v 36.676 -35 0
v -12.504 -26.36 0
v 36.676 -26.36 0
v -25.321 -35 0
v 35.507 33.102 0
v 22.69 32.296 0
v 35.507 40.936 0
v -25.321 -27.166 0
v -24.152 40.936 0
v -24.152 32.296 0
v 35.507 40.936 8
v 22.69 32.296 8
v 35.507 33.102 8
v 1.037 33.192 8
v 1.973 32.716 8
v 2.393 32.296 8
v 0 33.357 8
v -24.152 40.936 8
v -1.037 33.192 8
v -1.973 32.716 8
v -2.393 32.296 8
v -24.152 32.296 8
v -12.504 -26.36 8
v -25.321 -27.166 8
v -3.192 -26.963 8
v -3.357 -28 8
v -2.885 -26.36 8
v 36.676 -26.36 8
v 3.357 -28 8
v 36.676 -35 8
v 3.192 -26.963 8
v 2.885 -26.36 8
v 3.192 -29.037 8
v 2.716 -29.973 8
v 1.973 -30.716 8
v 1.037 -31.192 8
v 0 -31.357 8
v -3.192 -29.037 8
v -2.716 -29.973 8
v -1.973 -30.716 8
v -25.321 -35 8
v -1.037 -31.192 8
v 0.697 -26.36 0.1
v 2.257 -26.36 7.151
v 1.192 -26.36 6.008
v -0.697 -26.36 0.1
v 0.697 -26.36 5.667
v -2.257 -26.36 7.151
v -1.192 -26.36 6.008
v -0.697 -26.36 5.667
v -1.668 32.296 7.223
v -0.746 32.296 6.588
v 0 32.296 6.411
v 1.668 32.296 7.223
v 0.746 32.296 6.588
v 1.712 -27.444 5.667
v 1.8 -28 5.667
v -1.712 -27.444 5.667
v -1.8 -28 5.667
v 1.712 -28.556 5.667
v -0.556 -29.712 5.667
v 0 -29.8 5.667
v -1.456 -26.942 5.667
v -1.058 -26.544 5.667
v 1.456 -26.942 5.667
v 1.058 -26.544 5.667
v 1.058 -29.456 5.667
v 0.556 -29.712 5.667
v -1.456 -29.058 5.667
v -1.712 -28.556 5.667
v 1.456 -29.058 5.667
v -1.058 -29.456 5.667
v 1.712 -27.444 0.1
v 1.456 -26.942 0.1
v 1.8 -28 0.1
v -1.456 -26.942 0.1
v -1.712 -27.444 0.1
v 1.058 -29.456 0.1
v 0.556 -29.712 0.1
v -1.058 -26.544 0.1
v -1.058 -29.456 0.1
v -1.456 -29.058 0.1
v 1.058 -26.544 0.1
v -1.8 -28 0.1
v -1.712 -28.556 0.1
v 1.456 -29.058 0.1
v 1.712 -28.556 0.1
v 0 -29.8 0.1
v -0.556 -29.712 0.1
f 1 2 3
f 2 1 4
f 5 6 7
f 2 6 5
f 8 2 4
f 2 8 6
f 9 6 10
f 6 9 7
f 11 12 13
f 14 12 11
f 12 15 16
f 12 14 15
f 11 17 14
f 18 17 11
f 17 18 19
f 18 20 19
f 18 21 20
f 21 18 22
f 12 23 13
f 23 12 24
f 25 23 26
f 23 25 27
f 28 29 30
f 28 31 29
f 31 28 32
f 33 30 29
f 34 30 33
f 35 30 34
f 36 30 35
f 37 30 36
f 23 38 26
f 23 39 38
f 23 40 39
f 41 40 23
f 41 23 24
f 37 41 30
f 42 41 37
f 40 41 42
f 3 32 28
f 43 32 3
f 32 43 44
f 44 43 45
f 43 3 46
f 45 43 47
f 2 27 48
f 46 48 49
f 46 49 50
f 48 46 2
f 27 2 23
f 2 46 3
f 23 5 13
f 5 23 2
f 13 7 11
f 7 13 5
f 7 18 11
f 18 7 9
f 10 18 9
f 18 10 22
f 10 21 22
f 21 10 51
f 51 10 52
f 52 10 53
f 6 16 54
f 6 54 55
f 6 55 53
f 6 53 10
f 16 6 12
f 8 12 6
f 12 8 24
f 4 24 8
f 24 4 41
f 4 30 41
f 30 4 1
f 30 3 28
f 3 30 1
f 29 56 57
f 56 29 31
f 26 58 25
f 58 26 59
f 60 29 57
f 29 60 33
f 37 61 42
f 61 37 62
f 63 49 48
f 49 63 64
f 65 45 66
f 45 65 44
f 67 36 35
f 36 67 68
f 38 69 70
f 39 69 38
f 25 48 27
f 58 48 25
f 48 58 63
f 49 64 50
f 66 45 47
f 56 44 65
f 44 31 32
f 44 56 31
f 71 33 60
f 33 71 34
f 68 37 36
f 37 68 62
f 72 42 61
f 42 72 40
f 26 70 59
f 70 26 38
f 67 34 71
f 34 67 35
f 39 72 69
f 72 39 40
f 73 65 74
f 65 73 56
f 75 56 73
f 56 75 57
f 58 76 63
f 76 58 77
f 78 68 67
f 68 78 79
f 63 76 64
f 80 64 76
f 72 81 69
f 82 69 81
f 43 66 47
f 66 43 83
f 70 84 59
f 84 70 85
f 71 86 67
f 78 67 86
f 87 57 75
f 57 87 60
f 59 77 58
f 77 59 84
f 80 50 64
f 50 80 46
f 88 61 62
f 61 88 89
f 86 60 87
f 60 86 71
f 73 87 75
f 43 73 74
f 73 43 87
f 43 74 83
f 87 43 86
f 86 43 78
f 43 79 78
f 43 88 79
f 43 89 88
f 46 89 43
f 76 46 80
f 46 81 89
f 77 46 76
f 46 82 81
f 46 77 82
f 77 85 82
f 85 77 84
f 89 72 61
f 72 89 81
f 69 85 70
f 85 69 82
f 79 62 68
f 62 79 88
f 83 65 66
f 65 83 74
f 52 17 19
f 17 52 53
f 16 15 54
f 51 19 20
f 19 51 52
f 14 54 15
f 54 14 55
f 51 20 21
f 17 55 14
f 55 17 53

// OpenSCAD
// Street Numbers for 3D printing
// Charles Tilford, 2019
// License: CC BY-NC-SA 4.0
//   https://creativecommons.org/licenses/by-nc-sa/4.0/

char="Z";     // The number/letter to print

// Units are in mm, except for height of letter

// How many inches high should letter be?
inchesHigh=3;
// How thick/deep should letter be (mm)?
depth=8;

// Character coordinates just center the letter
charX=-30;    // Character X coord
charY=-35;    // Character Y coord
topScrew=30;  // Top screw Y coord
botScrew=-28; // Bottom screw Y coord
height=8;     // Thickness of character
// Screw dimensions. Default presumes
// #6 sheet metal screw
screwWid=3.6; // Width of screw shaft
screwTop=6.78;// Width of screw head
screwCon=5.08;// Height of head 'cone'

// Font to print in. Your system needs this
// installed, of course. If changed the hole
// positions almost certainly need to be
// changed, and maybe charX/charY.
fName="Open Sans Extrabold";
// https://fonts.google.com/specimen/Open+Sans
// Designer: Steve Matteson

// Thin floor below holes. My printer was
// struggling to have the hole 'border' stick
// to the stage. Just drill/screw thru it.
holeFloor=0.1; 

// ==========================================
// ===== All values below are auto-calculated
// ==========================================

// Scaled values
scaleFactor=inchesHigh / 3;
cX=charX * scaleFactor;
cY=charY * scaleFactor;
tS=topScrew * scaleFactor;
bS=botScrew * scaleFactor;
// Where do we start drawing screw head cone?
oS=depth - (screwCon-.05);

difference() {
  // We use difference() to punch out the screw holes
  // in the character
    
  // The character itself, 8mm thick
  translate([cX,cY,0])
    linear_extrude(height=depth, scale=1)
    text(char, size=(75*scaleFactor),
         $fn=100, font=fName);
    
  // Bottom screw hole
  translate([0,bS,oS]) color("red")
    cylinder(h=screwCon, d2=screwTop,
             d1=0, $fn=20);
   translate([0,bS,holeFloor])
    cylinder(h=20, d=screwWid, $fn=20);
    
  // Top screw hole
  translate([0,tS,oS]) color("red")
    cylinder(h=screwCon, d2=screwTop,
             d1=0, $fn=20);
  translate([0,tS,holeFloor])
    cylinder(h=20, d=screwWid, $fn=20);
}

// Colors are just to aid visualization of
// void spaces. $fn is "featuer number", ie how
// many polygons are devoted to object. The values
// above should be near your printing limit anyway.

// Developed in OpenSCAD
//    https://www.openscad.org/
